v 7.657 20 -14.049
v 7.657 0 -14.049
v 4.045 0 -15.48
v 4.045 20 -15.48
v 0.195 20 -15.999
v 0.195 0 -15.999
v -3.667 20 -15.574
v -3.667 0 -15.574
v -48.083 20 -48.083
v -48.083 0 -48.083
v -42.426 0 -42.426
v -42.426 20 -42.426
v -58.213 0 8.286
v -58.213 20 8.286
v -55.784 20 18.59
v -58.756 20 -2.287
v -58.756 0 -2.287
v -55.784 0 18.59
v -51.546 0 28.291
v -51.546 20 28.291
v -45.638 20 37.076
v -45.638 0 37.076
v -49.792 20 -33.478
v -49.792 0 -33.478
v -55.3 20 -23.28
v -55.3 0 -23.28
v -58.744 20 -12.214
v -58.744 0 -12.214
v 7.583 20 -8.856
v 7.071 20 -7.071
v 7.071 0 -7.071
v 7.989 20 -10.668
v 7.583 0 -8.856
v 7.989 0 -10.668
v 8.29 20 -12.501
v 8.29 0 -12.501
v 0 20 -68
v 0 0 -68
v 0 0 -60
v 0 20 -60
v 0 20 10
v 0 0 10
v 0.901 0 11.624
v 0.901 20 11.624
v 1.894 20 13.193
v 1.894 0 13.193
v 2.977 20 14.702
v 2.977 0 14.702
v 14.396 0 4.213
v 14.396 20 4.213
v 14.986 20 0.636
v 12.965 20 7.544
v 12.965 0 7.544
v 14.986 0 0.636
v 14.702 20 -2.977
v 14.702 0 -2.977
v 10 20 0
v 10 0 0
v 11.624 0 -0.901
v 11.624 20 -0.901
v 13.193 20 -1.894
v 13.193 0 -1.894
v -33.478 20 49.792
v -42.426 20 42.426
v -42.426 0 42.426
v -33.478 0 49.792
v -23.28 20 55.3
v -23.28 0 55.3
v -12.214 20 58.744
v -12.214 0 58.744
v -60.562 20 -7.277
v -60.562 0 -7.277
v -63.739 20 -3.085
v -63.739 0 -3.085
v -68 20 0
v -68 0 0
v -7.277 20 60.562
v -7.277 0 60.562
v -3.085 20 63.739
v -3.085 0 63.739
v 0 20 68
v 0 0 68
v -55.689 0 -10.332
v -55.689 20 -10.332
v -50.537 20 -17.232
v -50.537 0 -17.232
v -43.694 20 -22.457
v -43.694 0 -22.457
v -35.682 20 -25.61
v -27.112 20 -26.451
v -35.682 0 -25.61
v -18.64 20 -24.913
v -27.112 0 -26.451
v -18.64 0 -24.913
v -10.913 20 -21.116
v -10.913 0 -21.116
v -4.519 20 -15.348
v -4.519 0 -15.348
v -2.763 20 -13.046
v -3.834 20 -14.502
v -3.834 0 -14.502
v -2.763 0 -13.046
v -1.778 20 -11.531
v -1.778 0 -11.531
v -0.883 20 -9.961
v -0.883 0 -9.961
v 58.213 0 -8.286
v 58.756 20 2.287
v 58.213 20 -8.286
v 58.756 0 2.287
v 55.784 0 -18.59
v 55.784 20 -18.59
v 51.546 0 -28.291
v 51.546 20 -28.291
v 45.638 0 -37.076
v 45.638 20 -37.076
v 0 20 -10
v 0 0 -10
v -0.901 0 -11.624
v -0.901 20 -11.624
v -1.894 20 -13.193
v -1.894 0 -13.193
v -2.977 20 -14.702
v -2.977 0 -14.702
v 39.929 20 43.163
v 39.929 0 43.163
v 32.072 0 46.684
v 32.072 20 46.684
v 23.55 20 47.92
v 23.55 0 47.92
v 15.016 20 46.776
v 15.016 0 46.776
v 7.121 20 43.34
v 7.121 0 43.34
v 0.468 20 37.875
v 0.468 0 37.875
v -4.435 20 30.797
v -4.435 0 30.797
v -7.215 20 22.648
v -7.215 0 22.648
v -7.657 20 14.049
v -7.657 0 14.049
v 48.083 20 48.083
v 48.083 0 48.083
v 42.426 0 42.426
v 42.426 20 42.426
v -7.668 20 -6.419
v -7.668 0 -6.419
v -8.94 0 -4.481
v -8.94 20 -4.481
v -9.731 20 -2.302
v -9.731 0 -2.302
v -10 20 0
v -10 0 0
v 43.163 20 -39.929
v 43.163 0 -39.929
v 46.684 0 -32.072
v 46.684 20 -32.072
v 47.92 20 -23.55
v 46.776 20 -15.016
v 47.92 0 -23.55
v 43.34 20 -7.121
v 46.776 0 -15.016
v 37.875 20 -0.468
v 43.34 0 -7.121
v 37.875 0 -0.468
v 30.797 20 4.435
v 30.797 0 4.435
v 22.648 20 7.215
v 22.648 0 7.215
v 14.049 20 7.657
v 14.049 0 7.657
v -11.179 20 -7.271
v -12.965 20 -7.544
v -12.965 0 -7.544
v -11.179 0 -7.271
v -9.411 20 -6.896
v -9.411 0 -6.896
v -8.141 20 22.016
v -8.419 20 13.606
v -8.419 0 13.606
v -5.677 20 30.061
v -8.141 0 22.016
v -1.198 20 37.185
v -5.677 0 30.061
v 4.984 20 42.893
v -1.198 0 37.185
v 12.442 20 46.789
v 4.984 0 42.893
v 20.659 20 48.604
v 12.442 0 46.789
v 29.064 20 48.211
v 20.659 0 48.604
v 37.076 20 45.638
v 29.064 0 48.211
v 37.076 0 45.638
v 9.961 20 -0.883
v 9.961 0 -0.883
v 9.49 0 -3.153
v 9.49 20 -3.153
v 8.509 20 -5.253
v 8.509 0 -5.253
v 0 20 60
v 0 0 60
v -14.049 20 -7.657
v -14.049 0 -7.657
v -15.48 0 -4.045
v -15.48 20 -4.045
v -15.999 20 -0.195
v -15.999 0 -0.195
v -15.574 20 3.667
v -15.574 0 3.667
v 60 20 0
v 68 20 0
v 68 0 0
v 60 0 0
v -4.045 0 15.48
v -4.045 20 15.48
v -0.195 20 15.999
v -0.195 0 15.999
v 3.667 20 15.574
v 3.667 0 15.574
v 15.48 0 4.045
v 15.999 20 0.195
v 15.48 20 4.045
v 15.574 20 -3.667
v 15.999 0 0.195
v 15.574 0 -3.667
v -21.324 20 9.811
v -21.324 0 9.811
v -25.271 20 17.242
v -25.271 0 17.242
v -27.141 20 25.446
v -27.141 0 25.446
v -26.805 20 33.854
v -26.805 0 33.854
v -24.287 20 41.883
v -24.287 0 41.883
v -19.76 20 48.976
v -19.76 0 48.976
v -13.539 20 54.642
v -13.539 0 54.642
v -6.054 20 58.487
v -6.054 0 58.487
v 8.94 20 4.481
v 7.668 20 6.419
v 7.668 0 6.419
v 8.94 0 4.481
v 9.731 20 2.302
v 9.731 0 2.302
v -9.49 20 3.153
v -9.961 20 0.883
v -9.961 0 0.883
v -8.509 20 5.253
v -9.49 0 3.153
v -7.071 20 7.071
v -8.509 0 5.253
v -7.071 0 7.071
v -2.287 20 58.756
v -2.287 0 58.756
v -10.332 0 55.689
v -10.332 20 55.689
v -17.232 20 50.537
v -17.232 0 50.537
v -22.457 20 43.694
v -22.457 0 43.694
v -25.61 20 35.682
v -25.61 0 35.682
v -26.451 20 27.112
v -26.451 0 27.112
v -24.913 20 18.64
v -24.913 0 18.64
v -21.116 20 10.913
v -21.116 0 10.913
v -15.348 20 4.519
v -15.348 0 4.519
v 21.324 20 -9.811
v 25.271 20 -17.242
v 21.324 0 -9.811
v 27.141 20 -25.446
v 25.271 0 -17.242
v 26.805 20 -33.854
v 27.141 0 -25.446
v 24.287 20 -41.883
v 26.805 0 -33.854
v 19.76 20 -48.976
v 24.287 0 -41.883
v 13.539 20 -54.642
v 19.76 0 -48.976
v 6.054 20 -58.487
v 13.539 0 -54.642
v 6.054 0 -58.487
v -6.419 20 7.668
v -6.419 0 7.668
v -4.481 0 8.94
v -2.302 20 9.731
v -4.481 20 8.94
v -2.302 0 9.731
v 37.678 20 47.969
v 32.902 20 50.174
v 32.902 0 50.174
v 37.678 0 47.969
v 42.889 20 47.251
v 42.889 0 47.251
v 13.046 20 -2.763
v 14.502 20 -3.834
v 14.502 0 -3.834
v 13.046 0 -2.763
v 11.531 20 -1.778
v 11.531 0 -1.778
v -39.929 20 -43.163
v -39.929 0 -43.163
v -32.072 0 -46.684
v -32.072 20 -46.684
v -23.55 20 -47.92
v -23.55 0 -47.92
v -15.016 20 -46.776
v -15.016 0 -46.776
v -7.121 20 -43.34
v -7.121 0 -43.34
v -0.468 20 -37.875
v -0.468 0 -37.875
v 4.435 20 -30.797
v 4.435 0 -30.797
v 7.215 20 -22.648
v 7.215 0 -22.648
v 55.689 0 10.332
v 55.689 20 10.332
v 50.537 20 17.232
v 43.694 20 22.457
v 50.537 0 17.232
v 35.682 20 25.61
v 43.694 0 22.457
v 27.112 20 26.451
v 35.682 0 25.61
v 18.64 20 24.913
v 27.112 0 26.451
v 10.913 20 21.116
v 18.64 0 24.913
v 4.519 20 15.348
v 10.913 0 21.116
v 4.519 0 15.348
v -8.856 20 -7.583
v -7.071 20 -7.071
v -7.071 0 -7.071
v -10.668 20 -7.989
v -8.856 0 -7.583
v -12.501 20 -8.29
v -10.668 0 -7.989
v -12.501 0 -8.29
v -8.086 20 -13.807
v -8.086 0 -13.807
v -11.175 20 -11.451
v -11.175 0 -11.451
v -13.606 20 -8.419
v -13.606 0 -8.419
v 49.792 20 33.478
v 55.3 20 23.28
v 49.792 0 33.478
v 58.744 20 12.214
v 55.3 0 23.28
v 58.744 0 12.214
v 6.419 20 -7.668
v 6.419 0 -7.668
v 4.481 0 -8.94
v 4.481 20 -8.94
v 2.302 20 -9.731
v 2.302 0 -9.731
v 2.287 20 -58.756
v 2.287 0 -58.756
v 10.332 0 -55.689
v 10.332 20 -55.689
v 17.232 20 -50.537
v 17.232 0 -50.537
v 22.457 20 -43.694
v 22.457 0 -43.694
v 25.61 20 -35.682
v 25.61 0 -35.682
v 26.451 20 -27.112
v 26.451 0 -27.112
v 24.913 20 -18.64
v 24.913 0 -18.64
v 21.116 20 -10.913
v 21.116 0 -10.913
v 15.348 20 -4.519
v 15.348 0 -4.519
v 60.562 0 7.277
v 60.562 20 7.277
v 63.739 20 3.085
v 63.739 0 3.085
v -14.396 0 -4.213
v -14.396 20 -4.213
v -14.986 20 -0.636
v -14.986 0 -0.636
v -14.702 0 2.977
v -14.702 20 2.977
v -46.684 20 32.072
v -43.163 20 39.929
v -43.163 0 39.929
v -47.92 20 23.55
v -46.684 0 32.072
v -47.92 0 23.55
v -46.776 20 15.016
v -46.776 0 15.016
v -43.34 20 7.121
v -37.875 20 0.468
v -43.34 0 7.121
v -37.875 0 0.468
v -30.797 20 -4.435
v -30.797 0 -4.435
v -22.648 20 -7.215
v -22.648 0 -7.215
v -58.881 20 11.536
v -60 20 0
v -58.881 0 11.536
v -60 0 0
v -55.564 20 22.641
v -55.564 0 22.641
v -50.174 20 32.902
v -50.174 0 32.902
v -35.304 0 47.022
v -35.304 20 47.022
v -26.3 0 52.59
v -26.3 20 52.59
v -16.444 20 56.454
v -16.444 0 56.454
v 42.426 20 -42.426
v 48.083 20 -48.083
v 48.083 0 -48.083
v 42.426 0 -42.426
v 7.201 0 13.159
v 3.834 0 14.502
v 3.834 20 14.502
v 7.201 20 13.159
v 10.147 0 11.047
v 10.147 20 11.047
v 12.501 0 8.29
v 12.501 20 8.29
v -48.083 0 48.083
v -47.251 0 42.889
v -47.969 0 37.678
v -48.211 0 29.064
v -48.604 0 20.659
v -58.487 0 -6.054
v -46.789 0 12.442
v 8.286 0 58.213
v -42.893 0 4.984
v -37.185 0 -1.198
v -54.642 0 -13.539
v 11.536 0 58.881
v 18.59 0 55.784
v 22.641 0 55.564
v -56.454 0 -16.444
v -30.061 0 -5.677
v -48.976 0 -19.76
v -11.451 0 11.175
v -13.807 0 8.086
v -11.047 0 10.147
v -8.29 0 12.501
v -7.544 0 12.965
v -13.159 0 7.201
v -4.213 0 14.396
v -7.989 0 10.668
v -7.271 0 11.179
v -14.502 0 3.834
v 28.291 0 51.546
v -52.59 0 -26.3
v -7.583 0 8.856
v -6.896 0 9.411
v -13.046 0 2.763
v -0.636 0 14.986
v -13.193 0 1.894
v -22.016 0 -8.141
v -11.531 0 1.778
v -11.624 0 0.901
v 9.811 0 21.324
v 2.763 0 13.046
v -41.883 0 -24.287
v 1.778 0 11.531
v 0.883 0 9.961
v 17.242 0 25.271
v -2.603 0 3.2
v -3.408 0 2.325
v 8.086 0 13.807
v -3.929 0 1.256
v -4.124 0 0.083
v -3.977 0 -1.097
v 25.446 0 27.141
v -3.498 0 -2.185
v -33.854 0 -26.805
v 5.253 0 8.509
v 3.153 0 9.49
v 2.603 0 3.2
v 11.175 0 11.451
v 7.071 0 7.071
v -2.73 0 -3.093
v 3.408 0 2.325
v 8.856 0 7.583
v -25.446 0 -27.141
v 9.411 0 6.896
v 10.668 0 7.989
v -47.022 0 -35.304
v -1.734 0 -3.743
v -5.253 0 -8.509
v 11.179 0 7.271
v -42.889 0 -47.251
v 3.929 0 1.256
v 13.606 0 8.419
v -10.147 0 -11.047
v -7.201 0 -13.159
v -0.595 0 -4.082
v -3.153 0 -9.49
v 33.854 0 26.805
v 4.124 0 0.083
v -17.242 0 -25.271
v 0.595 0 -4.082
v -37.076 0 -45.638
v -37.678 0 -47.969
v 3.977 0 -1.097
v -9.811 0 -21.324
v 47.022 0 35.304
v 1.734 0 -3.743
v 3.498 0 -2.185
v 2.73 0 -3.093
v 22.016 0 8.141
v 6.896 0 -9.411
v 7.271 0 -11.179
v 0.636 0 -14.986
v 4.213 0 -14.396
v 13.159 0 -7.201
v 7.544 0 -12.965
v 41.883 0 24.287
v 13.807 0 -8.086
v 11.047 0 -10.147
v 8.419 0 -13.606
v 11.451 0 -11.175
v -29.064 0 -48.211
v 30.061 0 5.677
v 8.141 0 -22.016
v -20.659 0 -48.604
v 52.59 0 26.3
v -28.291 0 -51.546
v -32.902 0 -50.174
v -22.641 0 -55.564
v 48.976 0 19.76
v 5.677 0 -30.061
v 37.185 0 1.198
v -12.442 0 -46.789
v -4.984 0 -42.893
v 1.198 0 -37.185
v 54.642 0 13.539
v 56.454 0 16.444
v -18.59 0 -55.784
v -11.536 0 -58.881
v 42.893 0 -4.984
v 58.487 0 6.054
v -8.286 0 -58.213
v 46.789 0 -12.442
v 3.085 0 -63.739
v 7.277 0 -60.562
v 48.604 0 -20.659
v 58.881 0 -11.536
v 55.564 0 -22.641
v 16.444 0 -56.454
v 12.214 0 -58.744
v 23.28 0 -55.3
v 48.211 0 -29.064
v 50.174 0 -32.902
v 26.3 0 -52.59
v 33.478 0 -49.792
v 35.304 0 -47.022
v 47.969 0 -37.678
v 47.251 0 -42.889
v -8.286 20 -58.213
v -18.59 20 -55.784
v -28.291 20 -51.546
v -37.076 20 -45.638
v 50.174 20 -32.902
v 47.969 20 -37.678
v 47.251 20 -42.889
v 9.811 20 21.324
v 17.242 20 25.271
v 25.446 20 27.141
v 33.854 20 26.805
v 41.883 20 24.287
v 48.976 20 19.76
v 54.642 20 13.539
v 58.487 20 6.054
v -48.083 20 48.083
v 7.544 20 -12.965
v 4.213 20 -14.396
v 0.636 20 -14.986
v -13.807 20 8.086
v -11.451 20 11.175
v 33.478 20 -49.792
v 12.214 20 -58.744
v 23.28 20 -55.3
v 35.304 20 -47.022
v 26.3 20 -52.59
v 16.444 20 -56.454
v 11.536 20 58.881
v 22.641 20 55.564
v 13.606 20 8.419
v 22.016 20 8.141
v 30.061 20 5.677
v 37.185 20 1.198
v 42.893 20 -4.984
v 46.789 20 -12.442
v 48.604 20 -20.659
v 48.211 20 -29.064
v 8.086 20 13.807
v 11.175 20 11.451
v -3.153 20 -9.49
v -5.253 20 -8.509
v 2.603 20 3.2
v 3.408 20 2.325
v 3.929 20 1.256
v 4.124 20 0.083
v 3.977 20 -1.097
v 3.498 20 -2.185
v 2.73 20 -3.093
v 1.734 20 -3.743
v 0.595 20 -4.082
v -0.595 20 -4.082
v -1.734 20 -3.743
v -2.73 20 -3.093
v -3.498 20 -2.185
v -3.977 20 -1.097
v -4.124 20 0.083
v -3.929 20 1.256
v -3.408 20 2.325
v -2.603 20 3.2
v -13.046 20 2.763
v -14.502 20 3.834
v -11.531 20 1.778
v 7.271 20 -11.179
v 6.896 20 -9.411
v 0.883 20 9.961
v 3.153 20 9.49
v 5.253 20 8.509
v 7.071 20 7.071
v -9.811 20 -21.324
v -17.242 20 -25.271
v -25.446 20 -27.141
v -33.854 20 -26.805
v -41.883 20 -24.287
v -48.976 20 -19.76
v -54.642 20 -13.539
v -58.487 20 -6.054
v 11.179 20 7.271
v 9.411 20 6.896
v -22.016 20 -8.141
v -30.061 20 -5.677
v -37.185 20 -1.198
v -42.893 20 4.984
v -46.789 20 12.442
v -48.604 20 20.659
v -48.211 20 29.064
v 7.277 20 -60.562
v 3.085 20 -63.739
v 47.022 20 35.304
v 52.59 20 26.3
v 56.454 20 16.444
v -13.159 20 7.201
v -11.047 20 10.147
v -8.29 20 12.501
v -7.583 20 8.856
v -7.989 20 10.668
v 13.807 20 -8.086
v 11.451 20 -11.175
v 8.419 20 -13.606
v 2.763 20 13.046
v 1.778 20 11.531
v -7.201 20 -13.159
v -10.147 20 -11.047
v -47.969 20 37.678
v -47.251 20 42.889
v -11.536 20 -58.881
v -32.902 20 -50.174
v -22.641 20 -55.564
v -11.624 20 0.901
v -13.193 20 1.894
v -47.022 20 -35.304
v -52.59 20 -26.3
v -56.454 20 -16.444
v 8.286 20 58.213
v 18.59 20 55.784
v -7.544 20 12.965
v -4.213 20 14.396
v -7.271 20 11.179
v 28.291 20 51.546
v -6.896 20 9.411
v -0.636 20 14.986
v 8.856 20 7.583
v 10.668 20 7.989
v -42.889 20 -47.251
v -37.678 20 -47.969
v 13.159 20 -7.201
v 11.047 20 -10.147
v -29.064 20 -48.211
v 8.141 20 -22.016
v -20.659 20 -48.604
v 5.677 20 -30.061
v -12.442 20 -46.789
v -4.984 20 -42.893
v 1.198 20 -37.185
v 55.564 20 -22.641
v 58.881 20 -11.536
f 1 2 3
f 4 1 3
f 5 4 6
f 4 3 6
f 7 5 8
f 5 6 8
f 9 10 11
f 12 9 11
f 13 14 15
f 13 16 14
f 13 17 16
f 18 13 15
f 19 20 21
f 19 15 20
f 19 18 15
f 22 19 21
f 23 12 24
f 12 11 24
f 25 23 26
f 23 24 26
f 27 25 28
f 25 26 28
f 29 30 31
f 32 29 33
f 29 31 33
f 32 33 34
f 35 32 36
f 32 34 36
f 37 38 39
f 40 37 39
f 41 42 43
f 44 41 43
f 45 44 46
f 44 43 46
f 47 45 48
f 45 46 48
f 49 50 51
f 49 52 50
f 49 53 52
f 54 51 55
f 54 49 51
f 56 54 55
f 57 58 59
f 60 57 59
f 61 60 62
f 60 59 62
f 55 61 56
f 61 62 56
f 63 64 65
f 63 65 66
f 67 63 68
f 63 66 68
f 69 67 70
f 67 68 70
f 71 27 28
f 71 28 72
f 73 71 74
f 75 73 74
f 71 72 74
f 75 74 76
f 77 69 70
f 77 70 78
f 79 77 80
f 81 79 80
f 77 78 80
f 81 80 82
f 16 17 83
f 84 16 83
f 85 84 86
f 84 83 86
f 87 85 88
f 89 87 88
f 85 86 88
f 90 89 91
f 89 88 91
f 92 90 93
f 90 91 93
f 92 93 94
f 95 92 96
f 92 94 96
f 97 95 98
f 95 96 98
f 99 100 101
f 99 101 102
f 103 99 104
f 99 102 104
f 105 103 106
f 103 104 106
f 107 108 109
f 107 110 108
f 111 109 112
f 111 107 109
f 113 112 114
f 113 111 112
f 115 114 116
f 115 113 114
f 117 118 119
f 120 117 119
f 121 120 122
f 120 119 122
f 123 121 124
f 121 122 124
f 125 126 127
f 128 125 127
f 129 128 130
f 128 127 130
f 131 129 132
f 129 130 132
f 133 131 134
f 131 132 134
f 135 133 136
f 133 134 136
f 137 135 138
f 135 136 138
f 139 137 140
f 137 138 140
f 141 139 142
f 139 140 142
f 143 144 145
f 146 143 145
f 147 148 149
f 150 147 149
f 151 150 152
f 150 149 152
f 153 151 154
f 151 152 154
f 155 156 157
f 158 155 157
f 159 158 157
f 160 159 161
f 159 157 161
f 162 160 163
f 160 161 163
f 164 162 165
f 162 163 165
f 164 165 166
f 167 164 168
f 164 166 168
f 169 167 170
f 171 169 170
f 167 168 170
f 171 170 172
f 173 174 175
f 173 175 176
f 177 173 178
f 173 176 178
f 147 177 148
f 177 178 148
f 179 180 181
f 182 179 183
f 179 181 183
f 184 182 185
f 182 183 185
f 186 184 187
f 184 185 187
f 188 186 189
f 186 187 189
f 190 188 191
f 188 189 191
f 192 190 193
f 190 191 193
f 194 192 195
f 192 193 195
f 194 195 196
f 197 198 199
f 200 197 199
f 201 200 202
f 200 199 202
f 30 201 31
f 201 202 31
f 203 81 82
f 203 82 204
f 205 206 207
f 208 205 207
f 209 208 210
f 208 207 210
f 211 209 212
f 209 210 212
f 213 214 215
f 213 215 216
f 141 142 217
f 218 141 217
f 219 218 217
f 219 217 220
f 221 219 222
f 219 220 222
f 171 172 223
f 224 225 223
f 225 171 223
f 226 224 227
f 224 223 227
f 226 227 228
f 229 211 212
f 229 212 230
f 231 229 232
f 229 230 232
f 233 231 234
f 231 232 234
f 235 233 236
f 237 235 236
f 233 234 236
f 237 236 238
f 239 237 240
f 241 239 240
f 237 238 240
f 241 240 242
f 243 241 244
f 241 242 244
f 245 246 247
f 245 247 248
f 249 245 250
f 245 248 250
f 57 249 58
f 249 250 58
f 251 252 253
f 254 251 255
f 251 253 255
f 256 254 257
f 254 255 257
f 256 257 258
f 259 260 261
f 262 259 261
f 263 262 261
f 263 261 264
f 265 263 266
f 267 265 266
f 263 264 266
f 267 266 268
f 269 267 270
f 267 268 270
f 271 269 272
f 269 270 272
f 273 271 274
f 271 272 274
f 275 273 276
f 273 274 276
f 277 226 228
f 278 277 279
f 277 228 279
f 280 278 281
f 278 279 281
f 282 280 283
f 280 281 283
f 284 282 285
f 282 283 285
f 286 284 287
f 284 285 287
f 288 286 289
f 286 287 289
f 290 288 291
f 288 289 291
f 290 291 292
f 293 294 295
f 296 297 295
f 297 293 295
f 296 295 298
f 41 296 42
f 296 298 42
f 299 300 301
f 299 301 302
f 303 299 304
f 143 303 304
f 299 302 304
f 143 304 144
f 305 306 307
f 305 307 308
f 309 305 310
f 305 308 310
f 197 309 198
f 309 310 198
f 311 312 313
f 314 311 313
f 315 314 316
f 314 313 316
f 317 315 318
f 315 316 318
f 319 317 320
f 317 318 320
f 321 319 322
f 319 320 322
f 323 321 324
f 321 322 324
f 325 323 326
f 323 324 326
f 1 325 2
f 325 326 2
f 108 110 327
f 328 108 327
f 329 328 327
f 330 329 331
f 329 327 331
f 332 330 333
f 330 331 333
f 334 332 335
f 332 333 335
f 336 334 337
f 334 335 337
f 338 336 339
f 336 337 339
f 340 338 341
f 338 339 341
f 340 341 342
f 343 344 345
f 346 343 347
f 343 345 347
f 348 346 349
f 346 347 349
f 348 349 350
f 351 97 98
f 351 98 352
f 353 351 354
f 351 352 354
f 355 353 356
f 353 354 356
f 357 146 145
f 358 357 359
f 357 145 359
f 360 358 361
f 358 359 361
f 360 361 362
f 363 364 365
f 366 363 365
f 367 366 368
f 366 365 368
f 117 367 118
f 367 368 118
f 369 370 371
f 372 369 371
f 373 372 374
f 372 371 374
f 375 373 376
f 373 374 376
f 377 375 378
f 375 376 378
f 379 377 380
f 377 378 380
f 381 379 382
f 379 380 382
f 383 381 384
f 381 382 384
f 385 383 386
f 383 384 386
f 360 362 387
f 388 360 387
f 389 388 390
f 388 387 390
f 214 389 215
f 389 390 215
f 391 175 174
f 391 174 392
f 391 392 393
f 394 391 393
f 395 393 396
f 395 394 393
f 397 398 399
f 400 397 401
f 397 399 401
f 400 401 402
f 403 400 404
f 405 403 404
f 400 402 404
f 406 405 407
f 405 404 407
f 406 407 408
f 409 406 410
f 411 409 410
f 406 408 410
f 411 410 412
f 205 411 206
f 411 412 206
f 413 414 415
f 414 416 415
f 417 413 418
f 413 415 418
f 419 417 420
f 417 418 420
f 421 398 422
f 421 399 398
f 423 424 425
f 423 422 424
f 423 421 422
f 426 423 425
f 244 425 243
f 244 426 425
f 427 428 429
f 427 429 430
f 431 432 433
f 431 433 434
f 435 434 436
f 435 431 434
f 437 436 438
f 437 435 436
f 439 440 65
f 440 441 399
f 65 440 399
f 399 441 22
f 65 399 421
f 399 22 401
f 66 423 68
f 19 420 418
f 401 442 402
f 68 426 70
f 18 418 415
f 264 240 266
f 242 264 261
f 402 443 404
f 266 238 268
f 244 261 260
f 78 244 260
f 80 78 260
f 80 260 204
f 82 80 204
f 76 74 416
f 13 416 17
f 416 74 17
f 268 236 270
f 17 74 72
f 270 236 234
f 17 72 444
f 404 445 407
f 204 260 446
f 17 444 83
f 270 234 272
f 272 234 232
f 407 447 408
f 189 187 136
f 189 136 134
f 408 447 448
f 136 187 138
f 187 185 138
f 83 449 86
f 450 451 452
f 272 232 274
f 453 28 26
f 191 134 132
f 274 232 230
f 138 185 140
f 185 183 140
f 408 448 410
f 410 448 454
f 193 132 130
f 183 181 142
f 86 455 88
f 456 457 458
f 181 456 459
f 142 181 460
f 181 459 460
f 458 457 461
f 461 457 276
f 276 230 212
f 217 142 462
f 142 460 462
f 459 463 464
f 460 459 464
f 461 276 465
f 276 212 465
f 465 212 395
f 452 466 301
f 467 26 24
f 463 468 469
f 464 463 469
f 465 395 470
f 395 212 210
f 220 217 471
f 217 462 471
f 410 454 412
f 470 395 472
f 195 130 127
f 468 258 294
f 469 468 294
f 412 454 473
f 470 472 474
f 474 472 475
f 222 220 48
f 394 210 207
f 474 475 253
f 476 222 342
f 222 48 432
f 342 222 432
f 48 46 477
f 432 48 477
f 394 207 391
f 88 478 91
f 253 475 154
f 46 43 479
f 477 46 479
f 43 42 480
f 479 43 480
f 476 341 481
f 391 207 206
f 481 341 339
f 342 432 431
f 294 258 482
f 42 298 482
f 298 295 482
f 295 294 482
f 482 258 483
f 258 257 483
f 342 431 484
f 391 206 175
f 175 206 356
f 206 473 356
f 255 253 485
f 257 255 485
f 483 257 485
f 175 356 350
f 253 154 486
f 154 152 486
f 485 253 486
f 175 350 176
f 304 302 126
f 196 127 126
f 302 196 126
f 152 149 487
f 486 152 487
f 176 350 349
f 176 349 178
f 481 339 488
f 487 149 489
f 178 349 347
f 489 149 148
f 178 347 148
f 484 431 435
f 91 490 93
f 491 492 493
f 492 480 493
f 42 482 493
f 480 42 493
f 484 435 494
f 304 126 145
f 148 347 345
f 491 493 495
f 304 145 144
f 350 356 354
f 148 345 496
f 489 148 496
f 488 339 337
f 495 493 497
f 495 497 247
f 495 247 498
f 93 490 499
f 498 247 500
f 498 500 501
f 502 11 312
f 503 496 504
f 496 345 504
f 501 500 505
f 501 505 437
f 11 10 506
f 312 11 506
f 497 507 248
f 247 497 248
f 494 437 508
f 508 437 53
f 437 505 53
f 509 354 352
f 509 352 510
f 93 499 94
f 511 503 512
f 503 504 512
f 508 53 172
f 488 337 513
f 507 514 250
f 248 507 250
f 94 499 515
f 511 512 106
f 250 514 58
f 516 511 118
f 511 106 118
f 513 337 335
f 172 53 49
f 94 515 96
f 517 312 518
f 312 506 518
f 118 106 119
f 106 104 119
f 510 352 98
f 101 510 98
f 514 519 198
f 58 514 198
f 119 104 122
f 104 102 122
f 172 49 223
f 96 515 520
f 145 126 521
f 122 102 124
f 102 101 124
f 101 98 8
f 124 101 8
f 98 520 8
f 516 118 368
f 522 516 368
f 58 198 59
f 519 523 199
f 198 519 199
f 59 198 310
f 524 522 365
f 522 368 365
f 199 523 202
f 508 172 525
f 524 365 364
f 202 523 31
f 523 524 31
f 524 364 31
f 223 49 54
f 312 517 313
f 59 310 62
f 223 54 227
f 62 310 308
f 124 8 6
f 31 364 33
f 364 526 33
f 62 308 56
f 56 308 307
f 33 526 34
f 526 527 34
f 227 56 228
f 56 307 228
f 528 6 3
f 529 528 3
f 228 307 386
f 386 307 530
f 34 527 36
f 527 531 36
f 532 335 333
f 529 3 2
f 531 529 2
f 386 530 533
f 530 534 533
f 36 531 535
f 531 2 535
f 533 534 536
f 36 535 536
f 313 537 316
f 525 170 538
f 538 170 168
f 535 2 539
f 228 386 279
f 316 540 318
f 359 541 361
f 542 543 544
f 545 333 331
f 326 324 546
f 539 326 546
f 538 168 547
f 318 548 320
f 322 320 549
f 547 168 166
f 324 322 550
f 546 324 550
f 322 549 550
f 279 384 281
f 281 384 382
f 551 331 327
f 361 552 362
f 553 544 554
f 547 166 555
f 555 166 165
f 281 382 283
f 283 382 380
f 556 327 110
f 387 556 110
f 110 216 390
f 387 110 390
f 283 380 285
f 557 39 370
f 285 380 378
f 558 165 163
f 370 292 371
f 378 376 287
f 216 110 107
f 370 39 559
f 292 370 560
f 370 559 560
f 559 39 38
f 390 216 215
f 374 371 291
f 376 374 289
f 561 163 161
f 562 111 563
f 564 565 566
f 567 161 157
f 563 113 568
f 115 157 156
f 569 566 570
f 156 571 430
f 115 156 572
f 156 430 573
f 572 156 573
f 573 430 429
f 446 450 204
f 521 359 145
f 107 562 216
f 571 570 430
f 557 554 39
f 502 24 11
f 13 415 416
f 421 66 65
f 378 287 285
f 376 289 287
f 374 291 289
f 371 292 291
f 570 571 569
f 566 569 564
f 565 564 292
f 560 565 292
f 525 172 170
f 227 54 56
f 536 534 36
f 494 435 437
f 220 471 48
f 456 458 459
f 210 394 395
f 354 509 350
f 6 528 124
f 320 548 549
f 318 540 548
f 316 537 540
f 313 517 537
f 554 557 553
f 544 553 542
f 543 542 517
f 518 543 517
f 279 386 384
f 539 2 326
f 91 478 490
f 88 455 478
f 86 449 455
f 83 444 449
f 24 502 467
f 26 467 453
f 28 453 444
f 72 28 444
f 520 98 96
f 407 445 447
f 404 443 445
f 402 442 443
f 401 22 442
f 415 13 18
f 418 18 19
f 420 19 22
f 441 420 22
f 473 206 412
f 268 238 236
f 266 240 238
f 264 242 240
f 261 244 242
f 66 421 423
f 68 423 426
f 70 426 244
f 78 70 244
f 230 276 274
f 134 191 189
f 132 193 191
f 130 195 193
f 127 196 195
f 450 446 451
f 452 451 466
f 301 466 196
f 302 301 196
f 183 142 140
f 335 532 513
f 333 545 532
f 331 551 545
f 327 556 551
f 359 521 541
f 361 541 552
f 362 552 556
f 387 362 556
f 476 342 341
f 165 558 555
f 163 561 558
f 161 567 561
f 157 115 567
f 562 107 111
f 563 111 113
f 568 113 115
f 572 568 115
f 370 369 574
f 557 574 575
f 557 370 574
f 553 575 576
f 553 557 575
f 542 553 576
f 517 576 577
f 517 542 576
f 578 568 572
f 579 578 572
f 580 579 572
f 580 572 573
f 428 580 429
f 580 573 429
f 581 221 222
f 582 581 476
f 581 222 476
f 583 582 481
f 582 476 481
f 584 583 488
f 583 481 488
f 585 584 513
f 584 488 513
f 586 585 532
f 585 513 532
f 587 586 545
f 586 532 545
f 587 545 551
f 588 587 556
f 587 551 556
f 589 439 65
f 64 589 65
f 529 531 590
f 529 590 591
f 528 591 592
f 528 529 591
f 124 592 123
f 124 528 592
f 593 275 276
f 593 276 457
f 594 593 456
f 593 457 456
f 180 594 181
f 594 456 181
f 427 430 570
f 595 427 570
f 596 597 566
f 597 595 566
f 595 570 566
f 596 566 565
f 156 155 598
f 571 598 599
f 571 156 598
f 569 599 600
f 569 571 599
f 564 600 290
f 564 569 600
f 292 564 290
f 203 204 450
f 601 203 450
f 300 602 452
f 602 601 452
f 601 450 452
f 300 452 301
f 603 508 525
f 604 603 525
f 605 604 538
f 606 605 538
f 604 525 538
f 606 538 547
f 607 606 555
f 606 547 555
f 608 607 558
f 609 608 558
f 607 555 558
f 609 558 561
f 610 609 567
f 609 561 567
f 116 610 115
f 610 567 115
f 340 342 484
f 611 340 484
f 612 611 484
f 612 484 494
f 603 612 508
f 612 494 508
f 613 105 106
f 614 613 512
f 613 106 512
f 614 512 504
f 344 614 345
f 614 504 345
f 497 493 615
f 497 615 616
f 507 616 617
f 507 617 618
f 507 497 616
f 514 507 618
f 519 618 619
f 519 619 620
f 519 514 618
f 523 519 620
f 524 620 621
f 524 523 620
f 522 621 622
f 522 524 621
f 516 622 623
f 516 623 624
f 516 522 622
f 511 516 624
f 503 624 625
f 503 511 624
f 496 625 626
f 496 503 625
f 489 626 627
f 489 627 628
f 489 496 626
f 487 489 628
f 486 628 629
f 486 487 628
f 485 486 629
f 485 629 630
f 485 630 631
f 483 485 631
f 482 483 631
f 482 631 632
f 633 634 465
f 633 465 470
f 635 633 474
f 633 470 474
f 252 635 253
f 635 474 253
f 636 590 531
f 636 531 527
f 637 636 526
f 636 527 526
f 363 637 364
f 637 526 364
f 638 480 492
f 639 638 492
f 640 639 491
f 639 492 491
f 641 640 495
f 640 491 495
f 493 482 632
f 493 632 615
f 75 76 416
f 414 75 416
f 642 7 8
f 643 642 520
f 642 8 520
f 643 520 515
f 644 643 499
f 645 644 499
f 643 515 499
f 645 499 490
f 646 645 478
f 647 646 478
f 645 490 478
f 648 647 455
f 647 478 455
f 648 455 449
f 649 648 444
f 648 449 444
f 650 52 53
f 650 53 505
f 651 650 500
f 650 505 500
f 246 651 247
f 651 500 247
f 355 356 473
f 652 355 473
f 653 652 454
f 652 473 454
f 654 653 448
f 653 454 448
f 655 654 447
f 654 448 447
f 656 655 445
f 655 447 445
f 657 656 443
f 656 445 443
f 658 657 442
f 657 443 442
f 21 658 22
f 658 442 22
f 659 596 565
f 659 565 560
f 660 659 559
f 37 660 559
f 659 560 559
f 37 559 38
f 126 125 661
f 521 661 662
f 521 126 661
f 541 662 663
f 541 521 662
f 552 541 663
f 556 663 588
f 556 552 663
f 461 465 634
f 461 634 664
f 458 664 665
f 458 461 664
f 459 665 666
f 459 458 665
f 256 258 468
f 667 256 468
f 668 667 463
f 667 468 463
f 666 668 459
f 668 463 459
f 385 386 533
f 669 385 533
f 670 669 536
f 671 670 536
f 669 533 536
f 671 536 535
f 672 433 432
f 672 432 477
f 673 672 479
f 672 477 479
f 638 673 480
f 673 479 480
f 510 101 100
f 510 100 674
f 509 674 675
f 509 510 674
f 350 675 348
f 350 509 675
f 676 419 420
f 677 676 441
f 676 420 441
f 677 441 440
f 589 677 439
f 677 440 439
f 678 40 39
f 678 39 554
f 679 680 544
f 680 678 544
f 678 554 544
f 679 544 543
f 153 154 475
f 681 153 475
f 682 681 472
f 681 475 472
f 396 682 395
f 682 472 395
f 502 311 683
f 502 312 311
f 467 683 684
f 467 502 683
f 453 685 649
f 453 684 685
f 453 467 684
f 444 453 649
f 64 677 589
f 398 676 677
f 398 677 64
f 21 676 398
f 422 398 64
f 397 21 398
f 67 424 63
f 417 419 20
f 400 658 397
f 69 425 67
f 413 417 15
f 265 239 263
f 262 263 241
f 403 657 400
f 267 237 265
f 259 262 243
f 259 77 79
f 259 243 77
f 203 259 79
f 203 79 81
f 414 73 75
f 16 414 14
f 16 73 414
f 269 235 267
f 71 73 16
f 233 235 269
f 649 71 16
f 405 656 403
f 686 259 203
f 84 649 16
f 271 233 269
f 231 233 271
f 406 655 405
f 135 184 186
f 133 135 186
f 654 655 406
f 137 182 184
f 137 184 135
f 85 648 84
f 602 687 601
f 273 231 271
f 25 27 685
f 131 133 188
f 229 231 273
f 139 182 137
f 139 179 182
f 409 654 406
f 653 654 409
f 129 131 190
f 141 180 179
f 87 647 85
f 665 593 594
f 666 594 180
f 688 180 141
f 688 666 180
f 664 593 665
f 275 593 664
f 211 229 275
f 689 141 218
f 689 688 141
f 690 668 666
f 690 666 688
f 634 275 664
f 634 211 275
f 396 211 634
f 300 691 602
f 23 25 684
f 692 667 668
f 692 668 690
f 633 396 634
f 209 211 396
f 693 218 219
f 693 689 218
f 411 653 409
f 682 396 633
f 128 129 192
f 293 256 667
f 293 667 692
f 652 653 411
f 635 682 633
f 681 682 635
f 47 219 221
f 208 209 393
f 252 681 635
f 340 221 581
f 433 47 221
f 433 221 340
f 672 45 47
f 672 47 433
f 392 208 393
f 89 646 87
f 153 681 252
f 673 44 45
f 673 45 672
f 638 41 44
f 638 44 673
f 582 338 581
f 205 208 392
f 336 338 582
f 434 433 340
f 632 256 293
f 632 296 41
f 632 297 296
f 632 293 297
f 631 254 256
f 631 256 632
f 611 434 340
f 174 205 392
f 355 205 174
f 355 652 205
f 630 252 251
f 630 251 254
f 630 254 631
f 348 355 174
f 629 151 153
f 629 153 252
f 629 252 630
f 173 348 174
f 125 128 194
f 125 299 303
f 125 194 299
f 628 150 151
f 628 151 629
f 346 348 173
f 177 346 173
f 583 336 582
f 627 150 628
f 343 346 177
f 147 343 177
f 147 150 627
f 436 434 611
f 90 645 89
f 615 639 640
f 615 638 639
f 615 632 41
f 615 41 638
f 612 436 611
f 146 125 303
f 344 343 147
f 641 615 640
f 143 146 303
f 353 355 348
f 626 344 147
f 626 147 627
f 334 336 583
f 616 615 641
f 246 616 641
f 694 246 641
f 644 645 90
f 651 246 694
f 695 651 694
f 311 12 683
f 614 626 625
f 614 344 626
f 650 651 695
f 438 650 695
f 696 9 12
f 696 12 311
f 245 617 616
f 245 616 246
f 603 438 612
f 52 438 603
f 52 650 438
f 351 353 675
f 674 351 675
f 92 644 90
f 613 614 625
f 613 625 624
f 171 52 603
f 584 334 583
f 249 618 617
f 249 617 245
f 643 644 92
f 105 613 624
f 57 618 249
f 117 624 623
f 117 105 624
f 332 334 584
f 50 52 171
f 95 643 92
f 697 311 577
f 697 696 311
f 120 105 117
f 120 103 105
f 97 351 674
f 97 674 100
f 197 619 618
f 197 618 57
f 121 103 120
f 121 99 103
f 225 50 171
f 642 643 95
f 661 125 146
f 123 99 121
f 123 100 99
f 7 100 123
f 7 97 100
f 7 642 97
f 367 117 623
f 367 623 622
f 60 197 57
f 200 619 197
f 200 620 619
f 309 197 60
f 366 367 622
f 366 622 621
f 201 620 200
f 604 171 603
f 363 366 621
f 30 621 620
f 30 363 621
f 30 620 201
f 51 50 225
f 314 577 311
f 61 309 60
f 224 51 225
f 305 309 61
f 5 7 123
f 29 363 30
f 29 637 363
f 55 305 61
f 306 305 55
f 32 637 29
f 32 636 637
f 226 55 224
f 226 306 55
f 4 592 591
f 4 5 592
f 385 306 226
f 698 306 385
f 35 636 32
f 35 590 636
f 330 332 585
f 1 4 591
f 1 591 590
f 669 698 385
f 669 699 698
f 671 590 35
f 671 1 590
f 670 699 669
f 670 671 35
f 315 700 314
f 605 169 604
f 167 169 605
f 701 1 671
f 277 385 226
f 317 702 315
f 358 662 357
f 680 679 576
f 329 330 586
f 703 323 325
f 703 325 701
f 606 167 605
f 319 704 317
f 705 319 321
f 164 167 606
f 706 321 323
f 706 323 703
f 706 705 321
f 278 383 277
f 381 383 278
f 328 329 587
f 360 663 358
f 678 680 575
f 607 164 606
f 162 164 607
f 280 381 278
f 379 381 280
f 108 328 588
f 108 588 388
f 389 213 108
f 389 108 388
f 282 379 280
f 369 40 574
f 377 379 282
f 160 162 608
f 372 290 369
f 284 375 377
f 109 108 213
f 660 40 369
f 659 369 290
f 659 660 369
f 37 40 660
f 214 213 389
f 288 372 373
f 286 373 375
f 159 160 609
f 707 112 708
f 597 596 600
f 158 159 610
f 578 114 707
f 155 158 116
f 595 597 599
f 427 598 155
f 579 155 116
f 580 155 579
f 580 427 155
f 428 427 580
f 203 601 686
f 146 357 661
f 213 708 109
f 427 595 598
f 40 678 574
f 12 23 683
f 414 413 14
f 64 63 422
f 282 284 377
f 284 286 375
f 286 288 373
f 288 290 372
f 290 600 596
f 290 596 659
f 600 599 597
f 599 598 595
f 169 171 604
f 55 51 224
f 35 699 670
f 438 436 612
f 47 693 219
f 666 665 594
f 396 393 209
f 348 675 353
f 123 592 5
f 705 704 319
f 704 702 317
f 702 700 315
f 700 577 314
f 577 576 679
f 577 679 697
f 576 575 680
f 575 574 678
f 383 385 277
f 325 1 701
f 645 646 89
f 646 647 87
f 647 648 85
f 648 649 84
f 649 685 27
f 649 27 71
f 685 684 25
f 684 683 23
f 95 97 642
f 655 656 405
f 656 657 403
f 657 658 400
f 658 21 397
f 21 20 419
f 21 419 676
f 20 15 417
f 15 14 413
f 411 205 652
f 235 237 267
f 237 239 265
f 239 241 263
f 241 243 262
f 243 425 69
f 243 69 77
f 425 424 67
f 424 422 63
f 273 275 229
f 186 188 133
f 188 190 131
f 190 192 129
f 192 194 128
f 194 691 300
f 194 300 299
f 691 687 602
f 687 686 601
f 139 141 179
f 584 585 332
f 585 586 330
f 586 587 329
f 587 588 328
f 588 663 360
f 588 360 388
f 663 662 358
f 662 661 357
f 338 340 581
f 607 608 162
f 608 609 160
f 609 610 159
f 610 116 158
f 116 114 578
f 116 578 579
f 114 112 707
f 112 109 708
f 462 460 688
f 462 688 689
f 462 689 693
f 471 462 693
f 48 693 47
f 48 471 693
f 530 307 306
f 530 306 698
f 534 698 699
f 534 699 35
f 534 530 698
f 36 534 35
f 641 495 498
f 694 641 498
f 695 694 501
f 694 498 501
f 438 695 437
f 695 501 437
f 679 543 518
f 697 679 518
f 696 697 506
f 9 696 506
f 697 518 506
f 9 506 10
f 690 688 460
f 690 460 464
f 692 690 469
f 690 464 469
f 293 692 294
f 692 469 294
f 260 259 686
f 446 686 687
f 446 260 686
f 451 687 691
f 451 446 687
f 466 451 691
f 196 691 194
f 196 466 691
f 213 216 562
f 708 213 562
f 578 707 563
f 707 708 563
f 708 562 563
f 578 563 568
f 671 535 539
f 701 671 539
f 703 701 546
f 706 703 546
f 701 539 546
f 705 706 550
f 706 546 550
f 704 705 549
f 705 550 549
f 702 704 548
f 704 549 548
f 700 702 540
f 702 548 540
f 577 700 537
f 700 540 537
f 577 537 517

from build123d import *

# Parameters (mm, degrees)
SKETCH1_R             = 60
SKETCH1_R_2           = 58.8
BOSS_EXTRUDE1_DEPTH   = 20
SKETCH1_R_3           = 10
BOSS_EXTRUDE1_2_DEPTH = 20
BOSS_EXTRUDE4_DEPTH   = 20
CIRPATTERN1_COUNT     = 8
SKETCH2_R             = 16
SKETCH2_R_2           = 15
BOSS_EXTRUDE2_DEPTH   = 20
BOSS_EXTRUDE3_DEPTH   = 20


with BuildPart() as part:
    # Sketch1 → Boss-Extrude1 (new body)
    with BuildSketch(Plane(origin=(0, 0, 0), x_dir=(1, 0, 0), z_dir=(0, 1, 0))):
        with Locations(Location((0, 0, 0), (0, 0, 270))):
            Circle(SKETCH1_R)
        with Locations(Location((0, 0, 0), (0, 0, 270))):
            Circle(SKETCH1_R_2, mode=Mode.SUBTRACT)
    extrude(amount=BOSS_EXTRUDE1_DEPTH)



with BuildPart() as body_2:
    # Sketch1 → Boss-Extrude1 2 (new body)
    with BuildSketch(Plane(origin=(0, 0, 0), x_dir=(1, 0, 0), z_dir=(0, 1, 0))):
        with Locations(Location((0, 0, 0), (0, 0, 270))):
            Circle(SKETCH1_R_3)
        with BuildLine():
            ThreePointArc((2.603003073, -3.2), (0, 4.125), (-2.603003073, -3.2))
            Line((-2.603003073, -3.2), (2.603003073, -3.2))
        make_face(mode=Mode.SUBTRACT)
    extrude(amount=BOSS_EXTRUDE1_2_DEPTH)


with BuildPart() as part_1:
    add(part.part)

    add(body_2.part)  # Boss-Extrude4 merges body 2
    # Sketch4 → Boss-Extrude4 (add)
    with BuildSketch(Plane(origin=(0, 0, 0), x_dir=(1, 0, 0), z_dir=(0, 1, 0))):
        with BuildLine():
            Line((-9.632475442, -0.71058124), (-10, 0))
            ThreePointArc((-10, 0), (-26.841730813, -33.640288469), (0, -60))
            Line((0, -60), (0.117199585, -59.208631402))
            ThreePointArc((0.117199585, -59.208631402), (-26.052615674, -33.508769279), (-9.632475442, -0.71058124))
        make_face()
    boss_extrude4 = extrude(amount=BOSS_EXTRUDE4_DEPTH)

    # CirPattern1: Boss-Extrude4 ×8 about axis
    cirpattern1_axis = Axis((0, 0, 0), (0, 1, 0))
    for i in range(1, CIRPATTERN1_COUNT):
        add(boss_extrude4.rotate(cirpattern1_axis, i * 360 / CIRPATTERN1_COUNT))

    # Sketch2 → Boss-Extrude2 (add)
    with BuildSketch(Plane(origin=(0, 0, 0), x_dir=(1, 0, 0), z_dir=(0, 1, 0))):
        Circle(SKETCH2_R)
        Circle(SKETCH2_R_2, mode=Mode.SUBTRACT)
    extrude(amount=BOSS_EXTRUDE2_DEPTH)

    # Sketch3 → Boss-Extrude3 (add)
    with BuildSketch(Plane(origin=(0, 0, 0), x_dir=(1, 0, 0), z_dir=(0, 1, 0))):
        with BuildLine():
            Line((0, -68), (0, -60))
            ThreePointArc((0, -60), (-6.139084092, -59.685104059), (-12.213729096, -58.74372155))
            ThreePointArc((-12.213729096, -58.74372155), (-5.063374474, -61.994967767), (0, -68))
        make_face()
        with BuildLine():
            ThreePointArc((42.426406871, -42.426406871), (37.862753824, -46.544729808), (32.901673193, -50.174494528))
            ThreePointArc((32.901673193, -50.174494527), (40.256715681, -47.417408534), (48.083261121, -48.08326112))
            Line((48.083261121, -48.08326112), (42.426406871, -42.426406871))
        make_face()
        with BuildLine():
            Line((-48.083261121, -48.083261121), (-42.426406872, -42.426406871))
            ThreePointArc((-42.426406871, -42.426406871), (-46.544729808, -37.862753824), (-50.174494528, -32.901673193))
            ThreePointArc((-50.174494528, -32.901673193), (-47.417408535, -40.256715682), (-48.083261121, -48.083261121))
        make_face()
        with BuildLine():
            ThreePointArc((60, 0), (59.685104059, -6.139084092), (58.74372155, -12.213729095))
            ThreePointArc((58.74372155, -12.213729095), (61.994967767, -5.063374474), (68, 1e-09))
            Line((68, 1e-09), (60, 1e-09))
        make_face()
        with BuildLine():
            Line((-68.000000001, 0), (-60.000000001, 0))
            ThreePointArc((-60, 0), (-59.685104059, 6.139084092), (-58.74372155, 12.213729096))
            ThreePointArc((-58.743721551, 12.213729096), (-61.994967768, 5.063374474), (-68.000000001, 0))
        make_face()
        with BuildLine():
            ThreePointArc((42.42640687, 42.426406872), (46.544729807, 37.862753825), (50.174494527, 32.901673194))
            ThreePointArc((50.174494527, 32.901673194), (47.417408534, 40.256715682), (48.08326112, 48.083261122))
            Line((48.08326112, 48.083261122), (42.42640687, 42.426406872))
        make_face()
        with BuildLine():
            Line((-48.083261122, 48.083261121), (-42.426406872, 42.426406871))
            ThreePointArc((-42.426406872, 42.426406871), (-37.862753824, 46.544729807), (-32.901673194, 50.174494527))
            ThreePointArc((-32.901673194, 50.174494528), (-40.256715682, 47.417408534), (-48.083261122, 48.083261121))
        make_face()
        with BuildLine():
            ThreePointArc((-1e-09, 60), (6.139084091, 59.685104059), (12.213729095, 58.74372155))
            ThreePointArc((12.213729095, 58.743721551), (5.063374473, 61.994967768), (-1e-09, 68.000000001))
            Line((-1e-09, 68.000000001), (-1e-09, 60.000000001))
        make_face()
    extrude(amount=BOSS_EXTRUDE3_DEPTH)


solid = part_1.part
